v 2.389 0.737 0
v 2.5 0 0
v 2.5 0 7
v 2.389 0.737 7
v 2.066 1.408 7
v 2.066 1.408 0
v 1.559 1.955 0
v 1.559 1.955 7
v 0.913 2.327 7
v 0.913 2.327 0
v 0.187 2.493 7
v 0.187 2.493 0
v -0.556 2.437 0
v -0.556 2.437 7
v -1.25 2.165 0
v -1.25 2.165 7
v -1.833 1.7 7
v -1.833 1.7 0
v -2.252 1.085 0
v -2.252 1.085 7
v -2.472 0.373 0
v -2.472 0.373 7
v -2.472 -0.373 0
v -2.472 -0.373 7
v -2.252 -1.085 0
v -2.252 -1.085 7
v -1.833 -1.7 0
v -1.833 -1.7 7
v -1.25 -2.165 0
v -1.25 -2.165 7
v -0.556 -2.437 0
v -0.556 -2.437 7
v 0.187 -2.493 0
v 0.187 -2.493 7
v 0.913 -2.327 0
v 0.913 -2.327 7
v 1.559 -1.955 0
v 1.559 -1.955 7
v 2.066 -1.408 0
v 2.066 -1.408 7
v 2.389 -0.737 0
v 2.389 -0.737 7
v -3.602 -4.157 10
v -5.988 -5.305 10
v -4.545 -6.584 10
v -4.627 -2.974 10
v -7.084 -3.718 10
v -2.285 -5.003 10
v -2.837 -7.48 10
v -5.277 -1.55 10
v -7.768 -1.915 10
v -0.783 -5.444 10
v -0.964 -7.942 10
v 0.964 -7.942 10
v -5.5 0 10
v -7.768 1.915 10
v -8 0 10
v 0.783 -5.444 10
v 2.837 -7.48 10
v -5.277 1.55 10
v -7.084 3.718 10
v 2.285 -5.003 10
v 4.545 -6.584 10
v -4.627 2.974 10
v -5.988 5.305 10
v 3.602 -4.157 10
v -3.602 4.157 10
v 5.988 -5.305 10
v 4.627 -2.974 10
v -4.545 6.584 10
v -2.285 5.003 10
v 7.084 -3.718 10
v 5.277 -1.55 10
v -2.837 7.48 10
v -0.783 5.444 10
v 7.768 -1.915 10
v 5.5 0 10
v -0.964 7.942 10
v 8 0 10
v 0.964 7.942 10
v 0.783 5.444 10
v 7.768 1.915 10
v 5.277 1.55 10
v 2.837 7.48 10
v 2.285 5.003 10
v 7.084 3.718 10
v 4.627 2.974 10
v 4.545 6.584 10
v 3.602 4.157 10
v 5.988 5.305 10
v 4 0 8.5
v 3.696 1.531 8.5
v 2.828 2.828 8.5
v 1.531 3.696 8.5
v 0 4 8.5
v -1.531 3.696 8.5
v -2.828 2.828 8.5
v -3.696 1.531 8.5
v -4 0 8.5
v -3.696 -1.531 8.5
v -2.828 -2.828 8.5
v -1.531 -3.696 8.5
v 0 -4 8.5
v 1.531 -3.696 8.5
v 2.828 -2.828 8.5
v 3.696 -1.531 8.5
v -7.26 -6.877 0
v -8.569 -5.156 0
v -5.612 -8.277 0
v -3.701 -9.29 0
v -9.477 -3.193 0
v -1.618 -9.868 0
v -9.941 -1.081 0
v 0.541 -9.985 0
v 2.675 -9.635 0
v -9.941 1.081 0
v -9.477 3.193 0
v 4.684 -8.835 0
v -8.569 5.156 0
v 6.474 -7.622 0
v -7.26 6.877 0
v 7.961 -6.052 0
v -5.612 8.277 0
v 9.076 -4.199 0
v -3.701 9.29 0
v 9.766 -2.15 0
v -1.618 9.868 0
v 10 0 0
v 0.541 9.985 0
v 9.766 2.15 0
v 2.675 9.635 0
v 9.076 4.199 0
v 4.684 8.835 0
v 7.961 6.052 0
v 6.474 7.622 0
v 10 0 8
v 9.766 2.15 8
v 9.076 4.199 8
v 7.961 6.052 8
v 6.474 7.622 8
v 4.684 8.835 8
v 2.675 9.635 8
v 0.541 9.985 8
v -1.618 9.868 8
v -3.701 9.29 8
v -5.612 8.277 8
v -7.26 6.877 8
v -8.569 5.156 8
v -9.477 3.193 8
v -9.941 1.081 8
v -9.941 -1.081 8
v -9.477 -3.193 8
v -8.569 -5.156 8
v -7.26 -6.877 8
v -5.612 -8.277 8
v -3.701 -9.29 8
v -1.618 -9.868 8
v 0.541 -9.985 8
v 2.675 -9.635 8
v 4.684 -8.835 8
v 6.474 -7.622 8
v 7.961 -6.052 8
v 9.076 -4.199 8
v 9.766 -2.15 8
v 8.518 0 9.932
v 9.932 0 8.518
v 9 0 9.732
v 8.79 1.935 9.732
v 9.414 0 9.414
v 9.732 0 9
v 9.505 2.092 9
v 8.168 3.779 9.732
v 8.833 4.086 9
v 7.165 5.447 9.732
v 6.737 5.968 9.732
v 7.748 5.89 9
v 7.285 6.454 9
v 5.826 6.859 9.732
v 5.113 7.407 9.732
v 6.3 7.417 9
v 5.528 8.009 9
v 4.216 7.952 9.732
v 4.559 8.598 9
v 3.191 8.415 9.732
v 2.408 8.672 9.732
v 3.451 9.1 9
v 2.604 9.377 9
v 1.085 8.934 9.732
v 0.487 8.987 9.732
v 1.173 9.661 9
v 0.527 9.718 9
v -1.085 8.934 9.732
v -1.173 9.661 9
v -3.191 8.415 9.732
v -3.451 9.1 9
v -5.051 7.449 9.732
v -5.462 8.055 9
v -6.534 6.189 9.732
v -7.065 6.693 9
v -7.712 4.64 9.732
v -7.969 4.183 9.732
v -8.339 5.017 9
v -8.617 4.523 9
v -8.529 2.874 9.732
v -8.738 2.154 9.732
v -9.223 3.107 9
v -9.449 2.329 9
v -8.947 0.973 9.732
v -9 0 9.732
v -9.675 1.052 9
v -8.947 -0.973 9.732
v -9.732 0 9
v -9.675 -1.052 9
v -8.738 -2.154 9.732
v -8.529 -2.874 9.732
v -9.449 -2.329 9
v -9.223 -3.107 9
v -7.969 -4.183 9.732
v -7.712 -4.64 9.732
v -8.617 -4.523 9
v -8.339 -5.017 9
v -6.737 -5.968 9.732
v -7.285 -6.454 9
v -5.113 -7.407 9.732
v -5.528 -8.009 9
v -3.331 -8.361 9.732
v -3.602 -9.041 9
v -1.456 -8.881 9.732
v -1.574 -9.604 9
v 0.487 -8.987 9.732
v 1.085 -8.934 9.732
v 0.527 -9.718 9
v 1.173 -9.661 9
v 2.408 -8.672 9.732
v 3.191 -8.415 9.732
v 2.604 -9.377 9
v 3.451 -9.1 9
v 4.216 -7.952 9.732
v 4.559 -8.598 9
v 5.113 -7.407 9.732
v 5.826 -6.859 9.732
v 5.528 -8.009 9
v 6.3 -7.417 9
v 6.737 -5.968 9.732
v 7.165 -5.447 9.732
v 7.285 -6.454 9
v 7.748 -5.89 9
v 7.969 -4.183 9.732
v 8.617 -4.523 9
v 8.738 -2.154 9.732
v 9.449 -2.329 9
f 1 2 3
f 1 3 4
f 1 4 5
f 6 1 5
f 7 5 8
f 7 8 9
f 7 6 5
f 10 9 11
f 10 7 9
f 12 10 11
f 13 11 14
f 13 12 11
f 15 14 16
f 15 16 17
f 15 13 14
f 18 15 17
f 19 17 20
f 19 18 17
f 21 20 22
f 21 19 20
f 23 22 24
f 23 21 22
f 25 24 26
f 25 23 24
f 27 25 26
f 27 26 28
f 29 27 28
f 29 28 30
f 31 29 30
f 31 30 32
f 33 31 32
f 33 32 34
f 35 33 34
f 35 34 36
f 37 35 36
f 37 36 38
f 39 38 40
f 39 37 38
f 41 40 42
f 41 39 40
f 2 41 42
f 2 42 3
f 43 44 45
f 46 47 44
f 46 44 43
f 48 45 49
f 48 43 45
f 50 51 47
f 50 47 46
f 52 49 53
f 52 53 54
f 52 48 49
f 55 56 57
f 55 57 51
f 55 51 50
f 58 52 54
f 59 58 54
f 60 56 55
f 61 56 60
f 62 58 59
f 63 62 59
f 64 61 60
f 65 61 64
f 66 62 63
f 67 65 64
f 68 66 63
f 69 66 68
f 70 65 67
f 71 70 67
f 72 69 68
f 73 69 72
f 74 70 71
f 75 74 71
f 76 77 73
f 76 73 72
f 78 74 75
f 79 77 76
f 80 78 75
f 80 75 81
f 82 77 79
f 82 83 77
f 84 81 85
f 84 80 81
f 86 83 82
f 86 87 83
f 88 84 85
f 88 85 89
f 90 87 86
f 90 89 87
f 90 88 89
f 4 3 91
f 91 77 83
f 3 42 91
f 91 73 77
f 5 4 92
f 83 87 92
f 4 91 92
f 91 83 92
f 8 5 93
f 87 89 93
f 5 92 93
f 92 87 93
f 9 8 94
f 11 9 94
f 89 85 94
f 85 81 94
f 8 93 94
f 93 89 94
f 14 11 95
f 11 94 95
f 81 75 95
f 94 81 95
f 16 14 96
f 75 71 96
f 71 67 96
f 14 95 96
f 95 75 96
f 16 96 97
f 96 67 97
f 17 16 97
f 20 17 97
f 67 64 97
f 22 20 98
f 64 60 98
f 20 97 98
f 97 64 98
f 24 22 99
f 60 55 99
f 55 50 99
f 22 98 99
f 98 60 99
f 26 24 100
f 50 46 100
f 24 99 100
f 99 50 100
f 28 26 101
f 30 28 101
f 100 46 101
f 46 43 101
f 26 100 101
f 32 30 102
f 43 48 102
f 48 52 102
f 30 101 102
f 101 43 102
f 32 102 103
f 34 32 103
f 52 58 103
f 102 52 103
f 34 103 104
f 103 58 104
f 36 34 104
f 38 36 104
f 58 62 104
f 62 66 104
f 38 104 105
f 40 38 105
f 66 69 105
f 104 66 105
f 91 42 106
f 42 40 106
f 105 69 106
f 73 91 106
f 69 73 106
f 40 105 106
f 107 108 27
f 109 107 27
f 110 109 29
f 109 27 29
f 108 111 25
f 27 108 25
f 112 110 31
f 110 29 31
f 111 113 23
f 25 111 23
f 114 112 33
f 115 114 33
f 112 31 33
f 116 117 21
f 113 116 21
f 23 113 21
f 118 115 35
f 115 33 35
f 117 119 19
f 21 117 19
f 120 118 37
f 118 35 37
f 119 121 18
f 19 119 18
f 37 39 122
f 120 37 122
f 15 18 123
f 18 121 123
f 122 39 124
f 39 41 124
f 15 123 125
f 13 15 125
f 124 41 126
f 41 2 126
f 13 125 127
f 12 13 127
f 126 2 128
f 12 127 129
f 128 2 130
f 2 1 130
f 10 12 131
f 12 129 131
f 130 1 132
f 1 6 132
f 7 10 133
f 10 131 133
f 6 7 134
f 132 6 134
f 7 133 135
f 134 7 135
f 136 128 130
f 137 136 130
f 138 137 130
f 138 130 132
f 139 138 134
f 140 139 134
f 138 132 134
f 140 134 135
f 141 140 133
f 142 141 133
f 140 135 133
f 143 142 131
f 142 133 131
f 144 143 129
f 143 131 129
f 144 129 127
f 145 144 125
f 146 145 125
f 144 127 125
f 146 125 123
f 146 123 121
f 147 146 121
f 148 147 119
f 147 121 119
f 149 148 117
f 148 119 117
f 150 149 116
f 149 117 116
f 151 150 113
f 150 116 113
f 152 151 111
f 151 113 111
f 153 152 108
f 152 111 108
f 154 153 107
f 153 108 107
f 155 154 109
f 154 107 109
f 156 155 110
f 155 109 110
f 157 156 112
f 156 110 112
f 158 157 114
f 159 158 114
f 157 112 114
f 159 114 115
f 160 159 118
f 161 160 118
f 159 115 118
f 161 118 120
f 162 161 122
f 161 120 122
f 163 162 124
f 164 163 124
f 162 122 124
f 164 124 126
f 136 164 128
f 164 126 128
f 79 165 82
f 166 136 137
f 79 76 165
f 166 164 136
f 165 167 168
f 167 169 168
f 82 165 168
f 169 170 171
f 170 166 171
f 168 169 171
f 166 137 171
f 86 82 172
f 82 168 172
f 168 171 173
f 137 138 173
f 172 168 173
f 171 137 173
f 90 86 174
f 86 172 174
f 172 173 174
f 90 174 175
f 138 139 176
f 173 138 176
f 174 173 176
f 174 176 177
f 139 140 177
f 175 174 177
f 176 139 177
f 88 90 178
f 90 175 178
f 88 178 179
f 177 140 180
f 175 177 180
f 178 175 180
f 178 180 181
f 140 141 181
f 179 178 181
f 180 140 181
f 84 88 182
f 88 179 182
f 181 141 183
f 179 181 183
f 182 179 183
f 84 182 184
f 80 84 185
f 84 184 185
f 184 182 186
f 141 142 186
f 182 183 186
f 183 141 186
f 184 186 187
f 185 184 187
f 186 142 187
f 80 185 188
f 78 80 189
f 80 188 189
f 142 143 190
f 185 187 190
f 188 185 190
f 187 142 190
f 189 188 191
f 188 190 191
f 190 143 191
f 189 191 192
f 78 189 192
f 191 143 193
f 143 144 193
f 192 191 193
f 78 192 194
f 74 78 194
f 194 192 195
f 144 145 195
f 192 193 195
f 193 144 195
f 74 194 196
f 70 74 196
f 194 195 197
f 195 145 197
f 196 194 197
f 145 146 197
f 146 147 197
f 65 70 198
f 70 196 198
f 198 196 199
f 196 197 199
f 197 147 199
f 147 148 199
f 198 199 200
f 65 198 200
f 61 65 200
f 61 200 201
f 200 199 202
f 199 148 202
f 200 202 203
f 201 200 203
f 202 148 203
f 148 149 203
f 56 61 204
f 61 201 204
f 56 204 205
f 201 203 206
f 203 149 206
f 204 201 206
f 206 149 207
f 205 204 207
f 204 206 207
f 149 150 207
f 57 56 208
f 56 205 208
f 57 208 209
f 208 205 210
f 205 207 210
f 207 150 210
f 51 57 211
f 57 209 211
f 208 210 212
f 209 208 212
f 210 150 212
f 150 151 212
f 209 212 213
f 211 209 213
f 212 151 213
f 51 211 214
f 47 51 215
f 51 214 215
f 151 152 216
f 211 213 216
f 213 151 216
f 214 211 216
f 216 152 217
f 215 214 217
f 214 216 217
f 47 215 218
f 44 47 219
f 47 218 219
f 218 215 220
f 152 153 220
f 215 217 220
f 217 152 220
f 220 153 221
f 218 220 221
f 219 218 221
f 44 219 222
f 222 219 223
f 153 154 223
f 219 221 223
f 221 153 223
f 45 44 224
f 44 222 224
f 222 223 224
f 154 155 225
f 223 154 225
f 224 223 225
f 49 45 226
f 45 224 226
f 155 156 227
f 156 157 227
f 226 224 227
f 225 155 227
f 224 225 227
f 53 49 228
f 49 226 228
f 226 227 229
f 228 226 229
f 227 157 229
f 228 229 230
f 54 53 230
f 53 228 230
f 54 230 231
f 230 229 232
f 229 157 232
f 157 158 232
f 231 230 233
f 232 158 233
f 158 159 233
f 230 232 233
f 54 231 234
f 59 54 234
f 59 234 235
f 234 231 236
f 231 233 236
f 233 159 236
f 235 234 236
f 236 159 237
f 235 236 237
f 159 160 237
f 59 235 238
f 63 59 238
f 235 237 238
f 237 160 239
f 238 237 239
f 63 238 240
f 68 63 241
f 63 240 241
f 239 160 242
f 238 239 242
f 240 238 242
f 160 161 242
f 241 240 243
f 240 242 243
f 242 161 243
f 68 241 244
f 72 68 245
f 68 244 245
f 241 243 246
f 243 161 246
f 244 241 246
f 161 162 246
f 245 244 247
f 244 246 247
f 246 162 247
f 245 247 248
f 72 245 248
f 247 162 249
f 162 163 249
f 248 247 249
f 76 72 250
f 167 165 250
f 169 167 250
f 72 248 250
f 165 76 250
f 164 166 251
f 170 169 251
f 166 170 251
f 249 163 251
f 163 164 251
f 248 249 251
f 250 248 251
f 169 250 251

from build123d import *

# Parameters (mm, degrees)
F0_R     = 10
F0_R_2   = 2.5
F1_DEPTH = 10
F2_SIZE  = 3
F3_R     = 2


with BuildPart() as f1:
    # F0 (on Top) → F1 (new body)
    with BuildSketch(Plane.XY):
        Circle(F0_R)
        Circle(F0_R_2, mode=Mode.SUBTRACT)
    extrude(amount=F1_DEPTH)

    # F2
    f2_edges = [f1.edges().sort_by_distance(p)[0] for p in [
        (-2.5, 0, 10),
    ]]
    chamfer(f2_edges, length=F2_SIZE)

    # F3
    f3_edges = [f1.edges().sort_by_distance(p)[0] for p in [
        (-10, 0, 10),
    ]]
    fillet(f3_edges, radius=F3_R)


solid = f1.part
